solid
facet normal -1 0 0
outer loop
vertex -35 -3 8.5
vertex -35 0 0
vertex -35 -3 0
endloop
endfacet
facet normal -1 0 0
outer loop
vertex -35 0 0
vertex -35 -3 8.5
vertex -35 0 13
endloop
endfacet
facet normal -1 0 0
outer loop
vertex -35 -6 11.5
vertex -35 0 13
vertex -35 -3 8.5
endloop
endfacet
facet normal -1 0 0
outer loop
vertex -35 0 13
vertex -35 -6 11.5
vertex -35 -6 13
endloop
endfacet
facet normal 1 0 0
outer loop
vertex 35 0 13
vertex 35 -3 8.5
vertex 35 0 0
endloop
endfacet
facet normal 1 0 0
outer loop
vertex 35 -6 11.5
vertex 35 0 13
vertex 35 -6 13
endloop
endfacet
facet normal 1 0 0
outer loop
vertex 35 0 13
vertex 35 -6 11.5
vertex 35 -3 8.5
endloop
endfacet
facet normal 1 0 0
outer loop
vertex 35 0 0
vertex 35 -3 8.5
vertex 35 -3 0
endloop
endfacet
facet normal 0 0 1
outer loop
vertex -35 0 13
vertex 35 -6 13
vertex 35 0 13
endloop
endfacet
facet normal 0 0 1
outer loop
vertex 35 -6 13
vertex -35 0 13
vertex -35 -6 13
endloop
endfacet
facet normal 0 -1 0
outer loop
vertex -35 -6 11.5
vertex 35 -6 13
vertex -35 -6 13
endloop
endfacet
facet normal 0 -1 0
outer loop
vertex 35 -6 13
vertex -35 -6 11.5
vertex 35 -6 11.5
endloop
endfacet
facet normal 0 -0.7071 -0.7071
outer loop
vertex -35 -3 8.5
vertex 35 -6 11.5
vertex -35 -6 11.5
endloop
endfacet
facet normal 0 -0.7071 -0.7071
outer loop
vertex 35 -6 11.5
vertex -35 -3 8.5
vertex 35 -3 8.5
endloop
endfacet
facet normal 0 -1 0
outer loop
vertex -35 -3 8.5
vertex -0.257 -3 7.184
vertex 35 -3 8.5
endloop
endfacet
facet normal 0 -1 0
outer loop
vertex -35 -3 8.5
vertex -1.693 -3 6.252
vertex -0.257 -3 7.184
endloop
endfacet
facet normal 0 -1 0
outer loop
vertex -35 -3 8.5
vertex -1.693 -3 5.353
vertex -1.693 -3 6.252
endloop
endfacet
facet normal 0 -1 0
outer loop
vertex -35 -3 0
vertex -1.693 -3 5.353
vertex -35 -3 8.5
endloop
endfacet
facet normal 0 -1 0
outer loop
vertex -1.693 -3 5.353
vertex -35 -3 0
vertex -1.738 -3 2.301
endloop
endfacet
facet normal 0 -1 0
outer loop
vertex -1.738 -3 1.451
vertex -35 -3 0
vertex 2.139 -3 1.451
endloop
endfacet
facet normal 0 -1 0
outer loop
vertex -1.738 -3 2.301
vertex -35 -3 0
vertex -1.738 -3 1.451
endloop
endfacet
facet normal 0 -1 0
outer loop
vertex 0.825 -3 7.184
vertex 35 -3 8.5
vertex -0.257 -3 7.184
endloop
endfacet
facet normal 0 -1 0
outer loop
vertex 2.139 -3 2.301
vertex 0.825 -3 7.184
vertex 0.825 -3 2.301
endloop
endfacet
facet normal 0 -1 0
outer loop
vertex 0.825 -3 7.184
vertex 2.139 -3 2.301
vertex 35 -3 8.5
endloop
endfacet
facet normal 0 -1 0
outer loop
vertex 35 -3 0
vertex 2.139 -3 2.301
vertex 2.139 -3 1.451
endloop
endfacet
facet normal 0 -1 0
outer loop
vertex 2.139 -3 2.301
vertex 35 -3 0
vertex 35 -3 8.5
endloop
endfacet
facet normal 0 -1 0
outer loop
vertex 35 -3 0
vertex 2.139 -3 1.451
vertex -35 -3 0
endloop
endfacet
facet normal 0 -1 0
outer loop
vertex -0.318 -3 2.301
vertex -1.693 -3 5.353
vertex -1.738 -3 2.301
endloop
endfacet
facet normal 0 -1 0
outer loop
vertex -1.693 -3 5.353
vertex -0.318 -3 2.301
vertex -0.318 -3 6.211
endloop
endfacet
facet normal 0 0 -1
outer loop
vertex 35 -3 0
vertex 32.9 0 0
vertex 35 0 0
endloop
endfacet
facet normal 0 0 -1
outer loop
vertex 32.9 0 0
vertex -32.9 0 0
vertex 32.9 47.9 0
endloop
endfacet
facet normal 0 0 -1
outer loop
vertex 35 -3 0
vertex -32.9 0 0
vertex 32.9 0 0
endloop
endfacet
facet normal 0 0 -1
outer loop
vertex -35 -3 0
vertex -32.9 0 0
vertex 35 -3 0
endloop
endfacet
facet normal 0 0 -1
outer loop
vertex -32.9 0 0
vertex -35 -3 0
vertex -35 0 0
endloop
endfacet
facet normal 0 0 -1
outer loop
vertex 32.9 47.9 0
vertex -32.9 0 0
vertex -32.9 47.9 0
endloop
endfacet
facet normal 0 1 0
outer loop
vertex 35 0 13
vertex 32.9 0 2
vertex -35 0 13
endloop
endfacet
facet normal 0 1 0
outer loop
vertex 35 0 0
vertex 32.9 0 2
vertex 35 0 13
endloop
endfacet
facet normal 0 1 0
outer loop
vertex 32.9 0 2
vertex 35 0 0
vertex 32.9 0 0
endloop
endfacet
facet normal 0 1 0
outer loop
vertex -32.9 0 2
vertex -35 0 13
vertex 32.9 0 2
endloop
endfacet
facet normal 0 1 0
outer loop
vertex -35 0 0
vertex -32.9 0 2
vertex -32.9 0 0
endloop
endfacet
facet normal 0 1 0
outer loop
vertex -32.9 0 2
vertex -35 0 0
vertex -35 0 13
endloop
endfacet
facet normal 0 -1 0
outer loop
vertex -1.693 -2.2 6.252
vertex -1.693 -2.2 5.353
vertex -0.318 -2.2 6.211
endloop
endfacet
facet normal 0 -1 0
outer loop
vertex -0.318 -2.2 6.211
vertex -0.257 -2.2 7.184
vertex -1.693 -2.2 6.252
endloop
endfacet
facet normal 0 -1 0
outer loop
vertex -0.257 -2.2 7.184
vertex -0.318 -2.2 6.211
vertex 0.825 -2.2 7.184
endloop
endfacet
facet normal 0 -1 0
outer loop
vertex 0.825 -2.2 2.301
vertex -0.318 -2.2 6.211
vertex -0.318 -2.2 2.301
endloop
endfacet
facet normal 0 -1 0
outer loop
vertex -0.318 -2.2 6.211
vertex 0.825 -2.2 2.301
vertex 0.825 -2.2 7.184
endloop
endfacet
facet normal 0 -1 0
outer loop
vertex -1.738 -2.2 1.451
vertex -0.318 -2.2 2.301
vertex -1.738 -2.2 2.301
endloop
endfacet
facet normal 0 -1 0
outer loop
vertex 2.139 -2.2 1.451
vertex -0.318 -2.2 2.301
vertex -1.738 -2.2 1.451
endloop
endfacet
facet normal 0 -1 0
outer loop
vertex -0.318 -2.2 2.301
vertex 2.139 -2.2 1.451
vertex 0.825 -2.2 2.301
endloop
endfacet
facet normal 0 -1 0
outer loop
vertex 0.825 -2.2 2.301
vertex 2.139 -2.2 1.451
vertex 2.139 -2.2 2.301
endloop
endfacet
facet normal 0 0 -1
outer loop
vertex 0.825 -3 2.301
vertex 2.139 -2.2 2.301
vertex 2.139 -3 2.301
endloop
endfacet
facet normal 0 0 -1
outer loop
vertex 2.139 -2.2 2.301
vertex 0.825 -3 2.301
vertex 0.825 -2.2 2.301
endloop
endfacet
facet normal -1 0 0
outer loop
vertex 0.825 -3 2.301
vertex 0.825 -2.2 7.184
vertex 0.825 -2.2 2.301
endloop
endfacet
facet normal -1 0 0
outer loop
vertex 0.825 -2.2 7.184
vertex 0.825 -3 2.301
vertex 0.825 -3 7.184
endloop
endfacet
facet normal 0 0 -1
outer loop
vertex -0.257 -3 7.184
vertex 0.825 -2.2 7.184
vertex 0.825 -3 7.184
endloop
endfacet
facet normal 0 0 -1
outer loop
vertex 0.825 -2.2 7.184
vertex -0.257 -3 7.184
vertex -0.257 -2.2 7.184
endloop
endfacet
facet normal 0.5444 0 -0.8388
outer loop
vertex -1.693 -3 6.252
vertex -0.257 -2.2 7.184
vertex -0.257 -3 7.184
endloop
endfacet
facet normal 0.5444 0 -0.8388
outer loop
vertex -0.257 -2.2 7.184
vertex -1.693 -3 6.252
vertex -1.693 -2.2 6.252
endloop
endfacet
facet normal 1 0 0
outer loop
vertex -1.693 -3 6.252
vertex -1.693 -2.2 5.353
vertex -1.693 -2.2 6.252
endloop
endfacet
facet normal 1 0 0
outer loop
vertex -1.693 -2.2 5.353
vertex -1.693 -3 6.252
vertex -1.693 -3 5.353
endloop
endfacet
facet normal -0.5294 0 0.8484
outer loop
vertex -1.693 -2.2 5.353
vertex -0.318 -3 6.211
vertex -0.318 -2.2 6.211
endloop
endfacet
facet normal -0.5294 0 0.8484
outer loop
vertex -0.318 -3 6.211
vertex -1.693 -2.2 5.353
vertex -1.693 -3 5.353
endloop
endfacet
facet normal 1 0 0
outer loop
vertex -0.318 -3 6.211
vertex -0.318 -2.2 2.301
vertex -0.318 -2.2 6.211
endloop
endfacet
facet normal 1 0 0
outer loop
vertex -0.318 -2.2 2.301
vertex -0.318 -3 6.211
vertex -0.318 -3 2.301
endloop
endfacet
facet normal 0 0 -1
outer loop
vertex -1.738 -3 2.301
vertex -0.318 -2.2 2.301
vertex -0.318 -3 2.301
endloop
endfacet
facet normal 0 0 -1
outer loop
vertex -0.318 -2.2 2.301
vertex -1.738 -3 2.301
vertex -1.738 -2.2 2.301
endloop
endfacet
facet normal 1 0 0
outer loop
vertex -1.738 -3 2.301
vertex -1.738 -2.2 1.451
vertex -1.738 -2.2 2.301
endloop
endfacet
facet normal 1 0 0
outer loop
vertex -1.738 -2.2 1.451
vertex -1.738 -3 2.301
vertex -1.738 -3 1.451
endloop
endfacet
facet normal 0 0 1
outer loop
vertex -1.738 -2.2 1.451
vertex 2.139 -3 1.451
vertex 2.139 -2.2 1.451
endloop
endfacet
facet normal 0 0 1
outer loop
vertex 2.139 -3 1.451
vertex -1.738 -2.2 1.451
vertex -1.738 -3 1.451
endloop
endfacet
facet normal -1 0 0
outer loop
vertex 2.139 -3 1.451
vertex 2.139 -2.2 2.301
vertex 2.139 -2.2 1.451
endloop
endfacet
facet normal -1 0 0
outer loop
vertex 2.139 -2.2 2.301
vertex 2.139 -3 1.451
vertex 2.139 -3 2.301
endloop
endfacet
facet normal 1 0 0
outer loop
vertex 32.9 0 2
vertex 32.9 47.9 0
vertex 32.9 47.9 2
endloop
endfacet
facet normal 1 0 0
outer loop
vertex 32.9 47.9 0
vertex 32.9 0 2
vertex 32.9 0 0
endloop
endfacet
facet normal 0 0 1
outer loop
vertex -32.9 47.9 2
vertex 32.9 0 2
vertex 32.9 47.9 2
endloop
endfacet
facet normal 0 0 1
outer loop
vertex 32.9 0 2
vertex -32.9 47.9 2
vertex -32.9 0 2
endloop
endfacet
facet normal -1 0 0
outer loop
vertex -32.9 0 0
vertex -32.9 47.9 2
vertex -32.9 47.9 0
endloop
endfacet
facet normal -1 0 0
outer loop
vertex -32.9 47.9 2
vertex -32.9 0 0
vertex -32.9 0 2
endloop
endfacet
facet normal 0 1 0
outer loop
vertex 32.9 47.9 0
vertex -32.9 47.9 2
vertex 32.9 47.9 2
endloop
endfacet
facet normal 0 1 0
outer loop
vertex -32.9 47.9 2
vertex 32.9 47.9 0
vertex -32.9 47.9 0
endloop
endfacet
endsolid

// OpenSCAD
// file: ../../lib/chimney.scad
// advent-chimney — shared dimensions and geometry. Renders nothing on its own.
//
// One frame for every model, the USE frame of a single section: x across the
// chimney's front, y from the front face (y = 0) back, z up from the
// section's bottom (z = 0). The chimney's footprint is centred on x = 0.
//
// Every joint in the stack is the same. The piece below has a POCKET in its
// top: its wall cut back to a thin outer rim, open upward, the rim's top
// bevelled 45° inward. The gate plate lies on the pocket's floor and slides
// out through a notch in the front wall, also open upward, so nothing about
// the gate is ever printed over air. The piece above has a RING under it:
// the inner part of its wall hanging down into the pocket over the plate,
// its outside bevelled 45° to sit on the rim's bevel. The ring lines the
// pieces up. The fireplace's top is a pocket (day 1), every section has a
// ring under and a pocket on top, and the cloud has a plug that fills the
// top section's empty pocket.

$fn = 64;

// ---- Chimney section -----------------------------------------------------
ch_w  = 70;      // outside width, across the front
ch_d  = 50;      // outside depth, front to back
ch_h  = 30;      // height of one section (the stack's pitch)
wall  = 3.6;     // wall thickness at the brick faces

in_w = ch_w - 2 * wall;     // shaft inside, 62.8
in_d = ch_d - 2 * wall;     // 42.8

// ---- Bricks (mortar is a recessed groove) --------------------------------
course   = 7.5;  // brick course height, mortar included; ch_h is 4 courses
pitch    = 22.5; // brick length, mortar included
mortar   = 1.0;  // mortar line width
mortar_d = 0.6;  // how deep the mortar is set back from the brick face
min_brick = 5;   // shortest brick end left at a corner

assert(abs(ch_h / course - round(ch_h / course)) < 1e-6
       && round(ch_h / course) % 2 == 0,
       "a section must be an even number of courses, or the bond breaks between sections");

// ---- Stacking joint and gate --------------------------------------------
groove_d  = 1.8;  // how far the pocket reaches into the walls
rim       = wall - groove_d;  // the pocket's outer rim (1.2 behind the mortar)
ring_v    = 1.5;  // straight part of the ring under a piece, below its bevel
joint_gap = 0.15; // ring to pocket wall, per side (tight wall fit)

gate_t    = 2.0;  // plate thickness
gate_side = 0.3;  // plate edge to pocket wall, per side (loose, it slides)
gate_vgap = 0.2;  // plate to the ring above it

// pocket depth below the joint: bevel, the ring's straight part, the plate
pocket_d = rim + ring_v + gate_vgap + gate_t;
gate_z   = ch_h - pocket_d;   // plate underside, in the section below's frame

assert(rim >= mortar_d + 1.2, "pocket rim too thin behind the mortar");
assert(wall - rim - joint_gap >= 1.2, "ring under a section too thin");

// ---- Helpers -------------------------------------------------------------

// Rectangle of the chimney's footprint, grown by `o` (negative shrinks).
module ch_rect(o = 0)
    translate([-ch_w / 2 - o, -o]) square([ch_w + 2 * o, ch_d + 2 * o]);

// A flat slice of a 2D shape, z in [z0, z0 + h].
module slab(z0, h) translate([0, 0, z0]) linear_extrude(h) children();

// ---- Brick texture -------------------------------------------------------

// Head-joint positions along a face `len` long, centred on 0, for a course
// of parity `p`. Odd and even courses are shifted half a brick, and corners
// alternate long and short ends.
function head_joints(len, p) =
    [for (i = [-20:20]) let(x = (p == 0 ? pitch / 2 : 0) + i * pitch)
        if (abs(x) < len / 2 - min_brick) x];

// The mortar to cut out of a w x d box (front face at y = y0, centred on
// x = 0), courses from z0 to z1 with bed joints on every multiple of
// `course`. Bed joints have a 45° roof so they print without support.
// `course0` is the global index of the course starting at z0, so the bond
// carries on across pieces. `top_open`: z1 is the piece's top face (a
// section's), and its joint is a plain step; otherwise something wider sits
// on z1 (the fireplace's corbel) and the bricks just end there.
// `bottom_cut`: how far the bottom joint's cut reaches below z0, to clear
// the bevelled ring hanging under a section instead of leaving a sliver.
module mortar_cut(w, d, z0, z1, y0 = 0, course0 = 0, top_open = true,
                  bottom_cut = 0) {
    n = round((z1 - z0) / course);
    // bed joints
    for (k = [0:top_open ? n : n - 1]) {
        zk = z0 + k * course;
        lo = k == 0 ? bottom_cut : 0;
        difference() {
            translate([-w / 2 - 1, y0 - 1, zk - mortar / 2 - lo])
                cube([w + 2, d + 2, mortar + lo]);
            // the top joint has nothing above it: a plain step, no feather
            if (k == n && top_open)
                translate([-w / 2 + mortar_d, y0 + mortar_d, zk - mortar / 2 - 0.01])
                    cube([w - 2 * mortar_d, d - 2 * mortar_d, mortar + 0.02]);
            else hull() {
                translate([-w / 2 + mortar_d, y0 + mortar_d, zk - mortar / 2 - lo - 0.01])
                    cube([w - 2 * mortar_d, d - 2 * mortar_d,
                          mortar - mortar_d + lo + 0.01]);
                translate([-w / 2, y0, zk + mortar / 2 - 0.001])
                    cube([w, d, 0.002]);
            }
        }
    }
    // head joints, one course at a time
    for (k = [0:n - 1]) {
        zk = z0 + k * course;
        p = (course0 + k) % 2;
        for (x = head_joints(w, p)) {
            translate([x, y0, zk]) head_cut();                          // front
            translate([x, y0 + d, zk]) mirror([0, 1, 0]) head_cut();    // back
        }
        for (yy = head_joints(d, p)) {
            translate([-w / 2, y0 + d / 2 + yy, zk]) rotate([0, 0, -90]) head_cut();
            translate([ w / 2, y0 + d / 2 + yy, zk]) rotate([0, 0,  90]) head_cut();
        }
    }
}

// One head joint on a face whose outside is -y, for the course starting at
// z = 0. It runs from inside the bed joint below to the bed joint above and
// its top follows that joint's 45° roof, so the two leave no sliver between.
module head_cut()
    hull() {
        translate([-mortar / 2, -1, -mortar / 2]) cube([mortar, 1, course + mortar]);
        translate([-mortar / 2, -1, -mortar / 2])
            cube([mortar, 1 + mortar_d, course + mortar - mortar_d]);
    }

// ---- Joint ---------------------------------------------------------------
// Both modules work in the JOINT frame: z = 0 is the joint line, the top of
// the piece below and the bottom edge of the piece above.

// What to cut from the top of the piece below: the rim's 45° bevel and the
// pocket. With `gate` the pocket is deep enough for the plate and has the
// front notch it slides out through.
module pocket_cut(gate = true) {
    d = gate ? pocket_d : rim + ring_v + gate_vgap;
    hull() {
        slab(-rim, 0.001) ch_rect(-rim);
        slab(1, 0.001) ch_rect(1);      // the 45° line through the outer edge
    }
    slab(-d, d + 1) ch_rect(-rim);
    if (gate)
        translate([-(in_w / 2 + groove_d), -1, -d])
            cube([in_w + 2 * groove_d, rim + 2, d + 2]);
}

// The ring under the piece above, solid (the caller cuts its shaft): a
// straight part inside the pocket, then the 45° bevel out to the outer edge
// that sits on the rim's bevel.
// (Not one hull: the bevel widens upward, so a hull would run straight from
// the straight part's bottom edge to the top and bulge past the bevel.)
module ring_solid() {
    slab(-(rim + ring_v), ring_v - joint_gap + 0.001) ch_rect(-(rim + joint_gap));
    hull() {
        slab(-(rim + joint_gap), 0.001) ch_rect(-(rim + joint_gap));
        slab(-0.001, 0.001) ch_rect(0);
    }
}
// main file
// gate — the pull-out floor of one section, carrying its day number.
//
// A plate lying in the pocket on top of the section below (or of the
// fireplace, for day 1), and a stone band across the chimney's front over the
// joint: the band stops the plate when it's home and carries the number. Its
// top edge is a pull lip to hook a finger under.
//
// Prints as it sits in the section: plate flat on the bed, band standing
// at its front edge. Export one per day: -D day=1 ... -D day=24.

include <../../lib/chimney.scad>

/* [Day] */
day = 1;            // the number on the band, 1 (bottom) ... 24 (top)

/* [Band] */
band_h = 13;        // band height, from the plate's underside
band_t = 3;         // band thickness, standing proud of the bricks
lip    = 3;         // how far the pull lip reaches forward of the band
lip_t  = 1.5;       // lip thickness at its tip
digit_h  = 6;       // number height
digit_d  = 0.8;     // number engraving depth
font = "Liberation Sans:style=Bold";

plate_w = in_w + 2 * (groove_d - gate_side);
plate_l = ch_d - rim - gate_side;   // from the front face to the pocket's back wall

assert(day >= 1 && day <= 24, "day is 1 ... 24");
assert(digit_d < band_t - 1.2, "number engraved through the band");
assert(digit_h + 2 <= band_h - lip_t - lip, "number doesn't fit under the lip");

// In the frame of the section BELOW: plate underside at gate_z, on the floor
// of that section's pocket, front face at y = 0.
module gate(n = day) {
    translate([0, 0, gate_z]) {
        // plate
        translate([-plate_w / 2, -0.01, 0]) cube([plate_w, plate_l + 0.01, gate_t]);
        // band with the pull lip along its top, 45° underneath
        difference() {
            rotate([90, 0, 90]) translate([0, 0, -ch_w / 2])
                linear_extrude(ch_w)
                    polygon([[0, 0], [-band_t, 0],
                             [-band_t, band_h - lip_t - lip],
                             [-band_t - lip, band_h - lip_t],
                             [-band_t - lip, band_h], [0, band_h]]);
            // the number, centred under the lip
            translate([0, -band_t + digit_d, (band_h - lip_t - lip) / 2])
                rotate([90, 0, 0]) linear_extrude(digit_d + 1)
                    text(str(n), size = digit_h, font = font,
                         halign = "center", valign = "center");
        }
    }
}

// print pose: plate underside on the bed
translate([0, 0, -gate_z]) gate();
